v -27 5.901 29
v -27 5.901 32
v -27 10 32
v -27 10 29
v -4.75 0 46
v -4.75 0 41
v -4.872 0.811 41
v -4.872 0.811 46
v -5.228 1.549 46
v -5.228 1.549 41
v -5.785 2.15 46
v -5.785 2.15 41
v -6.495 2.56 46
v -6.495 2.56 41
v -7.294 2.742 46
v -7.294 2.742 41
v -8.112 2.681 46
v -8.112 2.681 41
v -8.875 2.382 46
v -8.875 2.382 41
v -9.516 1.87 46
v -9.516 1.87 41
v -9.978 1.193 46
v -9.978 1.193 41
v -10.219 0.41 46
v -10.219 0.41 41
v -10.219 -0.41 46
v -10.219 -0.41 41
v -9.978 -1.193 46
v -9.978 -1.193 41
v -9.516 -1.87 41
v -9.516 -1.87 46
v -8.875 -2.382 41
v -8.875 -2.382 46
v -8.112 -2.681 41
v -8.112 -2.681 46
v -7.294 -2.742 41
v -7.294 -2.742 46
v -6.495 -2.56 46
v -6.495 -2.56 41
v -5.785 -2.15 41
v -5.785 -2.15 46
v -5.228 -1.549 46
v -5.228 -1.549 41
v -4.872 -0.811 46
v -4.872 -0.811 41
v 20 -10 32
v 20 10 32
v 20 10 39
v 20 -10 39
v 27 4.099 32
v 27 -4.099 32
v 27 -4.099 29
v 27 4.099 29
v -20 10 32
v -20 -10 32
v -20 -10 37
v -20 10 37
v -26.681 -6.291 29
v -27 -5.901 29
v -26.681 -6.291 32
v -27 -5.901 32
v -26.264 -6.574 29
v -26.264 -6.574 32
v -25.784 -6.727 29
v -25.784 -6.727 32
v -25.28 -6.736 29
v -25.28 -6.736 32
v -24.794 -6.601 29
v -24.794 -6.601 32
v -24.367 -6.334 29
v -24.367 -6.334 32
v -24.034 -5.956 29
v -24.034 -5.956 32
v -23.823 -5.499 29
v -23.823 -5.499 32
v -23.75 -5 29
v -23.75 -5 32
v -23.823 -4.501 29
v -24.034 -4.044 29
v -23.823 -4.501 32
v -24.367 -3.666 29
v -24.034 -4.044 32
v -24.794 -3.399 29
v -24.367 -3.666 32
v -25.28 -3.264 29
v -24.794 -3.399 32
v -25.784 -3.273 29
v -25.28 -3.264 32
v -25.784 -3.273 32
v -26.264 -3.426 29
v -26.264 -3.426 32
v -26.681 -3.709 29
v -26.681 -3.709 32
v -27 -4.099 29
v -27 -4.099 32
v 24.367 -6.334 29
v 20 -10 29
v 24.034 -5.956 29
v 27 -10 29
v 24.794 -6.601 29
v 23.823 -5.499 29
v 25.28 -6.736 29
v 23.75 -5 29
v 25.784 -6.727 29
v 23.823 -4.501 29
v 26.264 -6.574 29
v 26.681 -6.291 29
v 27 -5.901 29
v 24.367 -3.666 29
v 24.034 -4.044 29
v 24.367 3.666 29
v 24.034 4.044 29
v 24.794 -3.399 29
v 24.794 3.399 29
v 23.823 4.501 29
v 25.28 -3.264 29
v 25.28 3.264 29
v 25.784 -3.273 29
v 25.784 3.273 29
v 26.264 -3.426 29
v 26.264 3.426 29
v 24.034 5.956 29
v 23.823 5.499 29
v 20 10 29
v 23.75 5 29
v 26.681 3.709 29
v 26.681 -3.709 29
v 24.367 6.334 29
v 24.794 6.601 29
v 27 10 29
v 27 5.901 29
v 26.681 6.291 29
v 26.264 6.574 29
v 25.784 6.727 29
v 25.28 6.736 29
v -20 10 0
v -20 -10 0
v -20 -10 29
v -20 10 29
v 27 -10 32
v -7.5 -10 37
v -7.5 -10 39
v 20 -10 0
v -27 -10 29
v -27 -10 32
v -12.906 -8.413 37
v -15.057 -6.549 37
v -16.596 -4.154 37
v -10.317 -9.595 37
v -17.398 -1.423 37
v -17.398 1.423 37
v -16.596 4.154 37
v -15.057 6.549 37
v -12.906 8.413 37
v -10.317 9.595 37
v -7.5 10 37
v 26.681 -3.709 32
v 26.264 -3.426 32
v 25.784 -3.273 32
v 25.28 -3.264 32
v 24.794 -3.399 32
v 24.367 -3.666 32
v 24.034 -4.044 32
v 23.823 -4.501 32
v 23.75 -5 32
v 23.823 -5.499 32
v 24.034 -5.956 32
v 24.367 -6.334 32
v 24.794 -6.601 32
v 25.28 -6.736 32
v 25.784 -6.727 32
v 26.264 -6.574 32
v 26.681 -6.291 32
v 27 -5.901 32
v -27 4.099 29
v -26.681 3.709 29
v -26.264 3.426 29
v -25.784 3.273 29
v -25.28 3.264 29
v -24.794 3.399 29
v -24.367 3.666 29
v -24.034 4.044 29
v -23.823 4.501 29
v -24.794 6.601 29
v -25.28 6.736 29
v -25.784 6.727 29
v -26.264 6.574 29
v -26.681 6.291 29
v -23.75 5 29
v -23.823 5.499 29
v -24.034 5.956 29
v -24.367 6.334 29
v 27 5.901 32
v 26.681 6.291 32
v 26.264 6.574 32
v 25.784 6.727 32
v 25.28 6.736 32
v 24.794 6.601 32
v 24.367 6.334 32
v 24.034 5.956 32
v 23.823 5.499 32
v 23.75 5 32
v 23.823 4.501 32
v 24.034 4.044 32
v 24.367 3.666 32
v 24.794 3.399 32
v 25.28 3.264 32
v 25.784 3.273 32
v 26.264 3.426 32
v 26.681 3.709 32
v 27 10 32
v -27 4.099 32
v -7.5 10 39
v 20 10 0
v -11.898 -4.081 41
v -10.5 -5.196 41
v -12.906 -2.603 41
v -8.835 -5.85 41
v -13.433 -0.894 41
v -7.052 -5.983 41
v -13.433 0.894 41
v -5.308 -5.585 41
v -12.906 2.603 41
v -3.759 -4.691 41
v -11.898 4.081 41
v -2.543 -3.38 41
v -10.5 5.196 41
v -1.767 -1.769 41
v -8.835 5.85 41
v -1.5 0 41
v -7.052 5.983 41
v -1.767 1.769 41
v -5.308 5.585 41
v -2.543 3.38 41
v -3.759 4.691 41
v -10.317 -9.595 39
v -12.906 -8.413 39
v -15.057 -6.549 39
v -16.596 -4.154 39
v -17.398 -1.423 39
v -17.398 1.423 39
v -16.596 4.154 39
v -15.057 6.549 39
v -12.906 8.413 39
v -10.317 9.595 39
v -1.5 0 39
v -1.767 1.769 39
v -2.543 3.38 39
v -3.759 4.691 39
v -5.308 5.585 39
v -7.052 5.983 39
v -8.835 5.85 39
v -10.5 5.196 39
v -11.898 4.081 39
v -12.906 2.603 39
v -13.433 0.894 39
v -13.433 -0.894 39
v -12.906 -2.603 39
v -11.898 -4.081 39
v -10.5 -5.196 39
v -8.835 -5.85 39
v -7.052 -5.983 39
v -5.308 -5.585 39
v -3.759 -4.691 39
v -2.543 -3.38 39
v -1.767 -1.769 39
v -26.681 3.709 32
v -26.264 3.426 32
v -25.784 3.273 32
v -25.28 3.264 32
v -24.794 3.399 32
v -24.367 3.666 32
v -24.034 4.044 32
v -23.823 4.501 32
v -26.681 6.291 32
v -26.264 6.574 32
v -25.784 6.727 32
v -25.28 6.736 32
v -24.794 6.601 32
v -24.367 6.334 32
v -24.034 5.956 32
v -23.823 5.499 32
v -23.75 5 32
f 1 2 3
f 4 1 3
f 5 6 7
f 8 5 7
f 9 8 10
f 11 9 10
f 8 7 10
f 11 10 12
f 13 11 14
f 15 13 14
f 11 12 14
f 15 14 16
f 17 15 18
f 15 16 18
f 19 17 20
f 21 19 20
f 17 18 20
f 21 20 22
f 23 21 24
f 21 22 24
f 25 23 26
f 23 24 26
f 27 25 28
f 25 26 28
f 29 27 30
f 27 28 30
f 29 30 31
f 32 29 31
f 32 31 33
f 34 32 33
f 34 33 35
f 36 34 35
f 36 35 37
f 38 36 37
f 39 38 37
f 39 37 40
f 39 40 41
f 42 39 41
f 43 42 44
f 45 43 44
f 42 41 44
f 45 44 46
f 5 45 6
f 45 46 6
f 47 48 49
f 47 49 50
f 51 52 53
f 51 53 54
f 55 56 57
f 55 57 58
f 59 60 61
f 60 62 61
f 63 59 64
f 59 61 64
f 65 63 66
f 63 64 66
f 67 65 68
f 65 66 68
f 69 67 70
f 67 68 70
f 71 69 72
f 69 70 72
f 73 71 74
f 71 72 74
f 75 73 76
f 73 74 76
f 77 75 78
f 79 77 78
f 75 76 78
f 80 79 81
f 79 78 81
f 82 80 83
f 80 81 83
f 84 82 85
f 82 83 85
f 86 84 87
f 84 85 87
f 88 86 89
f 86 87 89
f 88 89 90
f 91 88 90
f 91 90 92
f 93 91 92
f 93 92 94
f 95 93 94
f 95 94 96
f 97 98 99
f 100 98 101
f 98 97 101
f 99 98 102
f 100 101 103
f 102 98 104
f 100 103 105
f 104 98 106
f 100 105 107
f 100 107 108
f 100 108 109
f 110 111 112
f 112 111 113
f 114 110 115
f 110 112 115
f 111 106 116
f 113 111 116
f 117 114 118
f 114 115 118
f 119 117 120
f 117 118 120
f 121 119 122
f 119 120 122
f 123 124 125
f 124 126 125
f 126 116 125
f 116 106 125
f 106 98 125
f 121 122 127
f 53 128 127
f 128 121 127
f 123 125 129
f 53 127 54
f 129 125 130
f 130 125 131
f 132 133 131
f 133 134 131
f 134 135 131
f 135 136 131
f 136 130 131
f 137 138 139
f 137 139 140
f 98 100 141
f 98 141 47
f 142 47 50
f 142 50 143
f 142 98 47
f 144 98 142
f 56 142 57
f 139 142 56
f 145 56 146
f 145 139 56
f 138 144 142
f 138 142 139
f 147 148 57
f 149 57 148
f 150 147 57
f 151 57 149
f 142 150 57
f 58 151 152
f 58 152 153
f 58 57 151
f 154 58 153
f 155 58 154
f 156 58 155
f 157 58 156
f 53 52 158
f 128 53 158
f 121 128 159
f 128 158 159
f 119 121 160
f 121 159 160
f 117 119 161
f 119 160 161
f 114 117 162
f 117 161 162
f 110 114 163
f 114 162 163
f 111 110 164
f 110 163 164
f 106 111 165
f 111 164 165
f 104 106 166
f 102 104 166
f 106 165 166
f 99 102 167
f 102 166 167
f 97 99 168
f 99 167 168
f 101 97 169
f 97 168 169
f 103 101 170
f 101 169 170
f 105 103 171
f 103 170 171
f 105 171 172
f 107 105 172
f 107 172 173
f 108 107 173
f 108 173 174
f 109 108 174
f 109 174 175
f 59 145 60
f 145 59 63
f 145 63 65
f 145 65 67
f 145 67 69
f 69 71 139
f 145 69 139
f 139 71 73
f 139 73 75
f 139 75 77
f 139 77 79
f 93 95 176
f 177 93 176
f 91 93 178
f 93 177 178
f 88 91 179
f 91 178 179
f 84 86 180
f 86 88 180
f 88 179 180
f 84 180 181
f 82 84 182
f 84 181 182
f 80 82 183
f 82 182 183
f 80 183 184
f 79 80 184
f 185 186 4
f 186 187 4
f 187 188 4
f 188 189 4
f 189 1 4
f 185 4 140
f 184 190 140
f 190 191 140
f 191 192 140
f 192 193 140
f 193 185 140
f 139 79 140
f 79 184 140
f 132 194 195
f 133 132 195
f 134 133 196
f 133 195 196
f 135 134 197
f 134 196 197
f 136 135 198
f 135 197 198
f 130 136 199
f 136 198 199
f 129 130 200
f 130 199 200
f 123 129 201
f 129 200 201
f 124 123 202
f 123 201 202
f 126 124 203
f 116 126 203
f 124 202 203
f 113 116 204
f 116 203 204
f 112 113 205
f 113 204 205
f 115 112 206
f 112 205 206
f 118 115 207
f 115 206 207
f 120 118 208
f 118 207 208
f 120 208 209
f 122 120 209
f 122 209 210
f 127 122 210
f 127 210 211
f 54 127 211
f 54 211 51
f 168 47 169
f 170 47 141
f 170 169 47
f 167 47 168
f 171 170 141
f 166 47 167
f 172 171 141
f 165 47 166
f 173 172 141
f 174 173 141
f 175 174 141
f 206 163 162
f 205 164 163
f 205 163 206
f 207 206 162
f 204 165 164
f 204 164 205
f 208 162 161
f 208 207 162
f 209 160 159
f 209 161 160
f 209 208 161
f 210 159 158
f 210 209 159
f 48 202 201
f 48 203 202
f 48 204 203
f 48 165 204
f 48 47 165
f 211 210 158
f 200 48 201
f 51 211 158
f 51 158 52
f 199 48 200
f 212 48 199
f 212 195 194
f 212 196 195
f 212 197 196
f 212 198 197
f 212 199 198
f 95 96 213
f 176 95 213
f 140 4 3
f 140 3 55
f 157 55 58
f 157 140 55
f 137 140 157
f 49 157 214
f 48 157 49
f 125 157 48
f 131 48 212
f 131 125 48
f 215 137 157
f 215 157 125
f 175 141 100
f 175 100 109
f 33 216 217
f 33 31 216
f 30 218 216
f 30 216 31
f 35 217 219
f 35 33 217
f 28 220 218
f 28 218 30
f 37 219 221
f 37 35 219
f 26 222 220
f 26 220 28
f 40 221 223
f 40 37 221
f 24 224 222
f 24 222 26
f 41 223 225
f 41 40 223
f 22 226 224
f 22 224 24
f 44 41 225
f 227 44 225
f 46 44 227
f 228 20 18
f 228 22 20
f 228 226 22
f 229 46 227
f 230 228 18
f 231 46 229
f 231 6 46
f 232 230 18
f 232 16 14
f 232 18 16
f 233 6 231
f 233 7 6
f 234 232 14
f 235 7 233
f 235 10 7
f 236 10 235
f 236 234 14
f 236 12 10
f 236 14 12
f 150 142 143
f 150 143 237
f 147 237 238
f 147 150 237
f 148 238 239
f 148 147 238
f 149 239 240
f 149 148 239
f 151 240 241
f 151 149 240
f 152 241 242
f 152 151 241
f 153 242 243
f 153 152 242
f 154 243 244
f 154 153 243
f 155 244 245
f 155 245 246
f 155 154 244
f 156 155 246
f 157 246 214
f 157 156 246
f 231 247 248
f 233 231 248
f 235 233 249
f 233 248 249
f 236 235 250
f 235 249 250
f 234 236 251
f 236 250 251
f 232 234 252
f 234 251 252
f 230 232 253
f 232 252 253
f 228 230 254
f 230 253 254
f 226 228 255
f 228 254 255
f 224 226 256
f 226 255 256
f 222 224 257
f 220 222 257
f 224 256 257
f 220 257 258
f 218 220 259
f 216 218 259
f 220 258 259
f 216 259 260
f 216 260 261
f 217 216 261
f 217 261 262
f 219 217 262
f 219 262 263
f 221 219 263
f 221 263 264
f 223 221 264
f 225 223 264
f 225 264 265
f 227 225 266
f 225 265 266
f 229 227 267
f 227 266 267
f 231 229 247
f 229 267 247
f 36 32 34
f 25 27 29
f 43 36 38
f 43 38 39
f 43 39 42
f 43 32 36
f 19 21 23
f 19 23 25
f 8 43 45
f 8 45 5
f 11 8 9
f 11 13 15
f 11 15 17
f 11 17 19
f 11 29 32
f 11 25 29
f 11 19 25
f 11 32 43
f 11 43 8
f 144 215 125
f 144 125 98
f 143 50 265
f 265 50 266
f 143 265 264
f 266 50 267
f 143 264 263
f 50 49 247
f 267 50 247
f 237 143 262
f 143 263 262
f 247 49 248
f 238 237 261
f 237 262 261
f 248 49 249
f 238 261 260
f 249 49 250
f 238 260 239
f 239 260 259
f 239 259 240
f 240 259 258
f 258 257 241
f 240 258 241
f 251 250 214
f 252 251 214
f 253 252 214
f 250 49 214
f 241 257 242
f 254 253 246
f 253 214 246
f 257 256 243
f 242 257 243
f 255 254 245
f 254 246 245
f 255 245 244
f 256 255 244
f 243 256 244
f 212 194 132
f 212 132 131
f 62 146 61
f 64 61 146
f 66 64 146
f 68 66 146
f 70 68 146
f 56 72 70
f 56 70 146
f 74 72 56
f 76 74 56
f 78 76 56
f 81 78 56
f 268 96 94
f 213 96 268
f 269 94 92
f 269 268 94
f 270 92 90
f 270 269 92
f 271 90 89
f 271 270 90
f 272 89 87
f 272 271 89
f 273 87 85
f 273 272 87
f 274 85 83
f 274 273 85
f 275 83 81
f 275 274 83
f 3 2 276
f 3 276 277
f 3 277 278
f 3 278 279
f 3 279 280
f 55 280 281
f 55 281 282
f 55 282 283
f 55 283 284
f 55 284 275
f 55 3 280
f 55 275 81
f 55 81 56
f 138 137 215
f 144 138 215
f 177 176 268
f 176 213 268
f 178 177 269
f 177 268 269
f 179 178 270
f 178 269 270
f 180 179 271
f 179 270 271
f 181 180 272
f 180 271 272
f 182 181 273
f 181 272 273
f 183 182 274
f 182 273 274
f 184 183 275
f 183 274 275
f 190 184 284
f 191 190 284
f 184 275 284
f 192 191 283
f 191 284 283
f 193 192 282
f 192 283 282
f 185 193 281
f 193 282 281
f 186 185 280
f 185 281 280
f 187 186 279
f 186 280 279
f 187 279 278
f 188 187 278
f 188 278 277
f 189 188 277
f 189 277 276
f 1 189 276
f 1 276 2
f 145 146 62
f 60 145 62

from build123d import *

# Parameters (mm, degrees)
SKETCH1_W           = 40
SKETCH1_H           = 20
BOSS_EXTRUDE1_DEPTH = 37
BOSS_EXTRUDE2_DEPTH = 2
SKETCH3_R           = 6
BOSS_EXTRUDE3_DEPTH = 2
SKETCH4_R           = 2.75
BOSS_EXTRUDE4_DEPTH = 5
SKETCH5_W           = 7
SKETCH5_H           = 20
BOSS_EXTRUDE5_DEPTH = 3
SKETCH7_R           = 1.75
CUT_EXTRUDE3_DEPTH  = 44.0464865


with BuildPart() as part:
    # Sketch1 → Boss-Extrude1 (new body)
    with BuildSketch(Plane.XY):
        Rectangle(SKETCH1_W, SKETCH1_H)
    extrude(amount=BOSS_EXTRUDE1_DEPTH)

    # Sketch2 → Boss-Extrude2 (add)
    with BuildSketch(Plane.XY.offset(37)):
        with BuildLine():
            Line((-7.5, 10), (20, 10))
            Line((20, 10), (20, -10))
            Line((20, -10), (-7.5, -10))
            ThreePointArc((-7.5, -10), (-17.5, 0), (-7.5, 10))
        make_face()
    extrude(amount=BOSS_EXTRUDE2_DEPTH)

    # Sketch3 → Boss-Extrude3 (add)
    with BuildSketch(Plane.XY.offset(39)):
        with Locations((-7.5, 0)):
            Circle(SKETCH3_R)
    extrude(amount=BOSS_EXTRUDE3_DEPTH)

    # Sketch4 → Boss-Extrude4 (add)
    with BuildSketch(Plane.XY.offset(41)):
        with Locations((-7.5, 0)):
            Circle(SKETCH4_R)
    extrude(amount=BOSS_EXTRUDE4_DEPTH)

    # Sketch5 → Boss-Extrude5 (add)
    with BuildSketch(Plane.XY.offset(32)):
        with Locations((-23.5, 0)):
            Rectangle(SKETCH5_W, SKETCH5_H)
        with Locations((23.5, 0)):
            Rectangle(SKETCH5_W, SKETCH5_H)
    extrude(amount=-BOSS_EXTRUDE5_DEPTH)

    # Sketch7 → Cut-Extrude3 (cut, through all)
    with BuildSketch(Plane.XY.offset(32)):
        with Locations((-25.5, 5)):
            Circle(SKETCH7_R)
        with Locations((-25.5, -5)):
            Circle(SKETCH7_R)
        with Locations((25.5, -5)):
            Circle(SKETCH7_R)
        with Locations((25.5, 5)):
            Circle(SKETCH7_R)
    extrude(amount=-CUT_EXTRUDE3_DEPTH, mode=Mode.SUBTRACT)


solid = part.part
